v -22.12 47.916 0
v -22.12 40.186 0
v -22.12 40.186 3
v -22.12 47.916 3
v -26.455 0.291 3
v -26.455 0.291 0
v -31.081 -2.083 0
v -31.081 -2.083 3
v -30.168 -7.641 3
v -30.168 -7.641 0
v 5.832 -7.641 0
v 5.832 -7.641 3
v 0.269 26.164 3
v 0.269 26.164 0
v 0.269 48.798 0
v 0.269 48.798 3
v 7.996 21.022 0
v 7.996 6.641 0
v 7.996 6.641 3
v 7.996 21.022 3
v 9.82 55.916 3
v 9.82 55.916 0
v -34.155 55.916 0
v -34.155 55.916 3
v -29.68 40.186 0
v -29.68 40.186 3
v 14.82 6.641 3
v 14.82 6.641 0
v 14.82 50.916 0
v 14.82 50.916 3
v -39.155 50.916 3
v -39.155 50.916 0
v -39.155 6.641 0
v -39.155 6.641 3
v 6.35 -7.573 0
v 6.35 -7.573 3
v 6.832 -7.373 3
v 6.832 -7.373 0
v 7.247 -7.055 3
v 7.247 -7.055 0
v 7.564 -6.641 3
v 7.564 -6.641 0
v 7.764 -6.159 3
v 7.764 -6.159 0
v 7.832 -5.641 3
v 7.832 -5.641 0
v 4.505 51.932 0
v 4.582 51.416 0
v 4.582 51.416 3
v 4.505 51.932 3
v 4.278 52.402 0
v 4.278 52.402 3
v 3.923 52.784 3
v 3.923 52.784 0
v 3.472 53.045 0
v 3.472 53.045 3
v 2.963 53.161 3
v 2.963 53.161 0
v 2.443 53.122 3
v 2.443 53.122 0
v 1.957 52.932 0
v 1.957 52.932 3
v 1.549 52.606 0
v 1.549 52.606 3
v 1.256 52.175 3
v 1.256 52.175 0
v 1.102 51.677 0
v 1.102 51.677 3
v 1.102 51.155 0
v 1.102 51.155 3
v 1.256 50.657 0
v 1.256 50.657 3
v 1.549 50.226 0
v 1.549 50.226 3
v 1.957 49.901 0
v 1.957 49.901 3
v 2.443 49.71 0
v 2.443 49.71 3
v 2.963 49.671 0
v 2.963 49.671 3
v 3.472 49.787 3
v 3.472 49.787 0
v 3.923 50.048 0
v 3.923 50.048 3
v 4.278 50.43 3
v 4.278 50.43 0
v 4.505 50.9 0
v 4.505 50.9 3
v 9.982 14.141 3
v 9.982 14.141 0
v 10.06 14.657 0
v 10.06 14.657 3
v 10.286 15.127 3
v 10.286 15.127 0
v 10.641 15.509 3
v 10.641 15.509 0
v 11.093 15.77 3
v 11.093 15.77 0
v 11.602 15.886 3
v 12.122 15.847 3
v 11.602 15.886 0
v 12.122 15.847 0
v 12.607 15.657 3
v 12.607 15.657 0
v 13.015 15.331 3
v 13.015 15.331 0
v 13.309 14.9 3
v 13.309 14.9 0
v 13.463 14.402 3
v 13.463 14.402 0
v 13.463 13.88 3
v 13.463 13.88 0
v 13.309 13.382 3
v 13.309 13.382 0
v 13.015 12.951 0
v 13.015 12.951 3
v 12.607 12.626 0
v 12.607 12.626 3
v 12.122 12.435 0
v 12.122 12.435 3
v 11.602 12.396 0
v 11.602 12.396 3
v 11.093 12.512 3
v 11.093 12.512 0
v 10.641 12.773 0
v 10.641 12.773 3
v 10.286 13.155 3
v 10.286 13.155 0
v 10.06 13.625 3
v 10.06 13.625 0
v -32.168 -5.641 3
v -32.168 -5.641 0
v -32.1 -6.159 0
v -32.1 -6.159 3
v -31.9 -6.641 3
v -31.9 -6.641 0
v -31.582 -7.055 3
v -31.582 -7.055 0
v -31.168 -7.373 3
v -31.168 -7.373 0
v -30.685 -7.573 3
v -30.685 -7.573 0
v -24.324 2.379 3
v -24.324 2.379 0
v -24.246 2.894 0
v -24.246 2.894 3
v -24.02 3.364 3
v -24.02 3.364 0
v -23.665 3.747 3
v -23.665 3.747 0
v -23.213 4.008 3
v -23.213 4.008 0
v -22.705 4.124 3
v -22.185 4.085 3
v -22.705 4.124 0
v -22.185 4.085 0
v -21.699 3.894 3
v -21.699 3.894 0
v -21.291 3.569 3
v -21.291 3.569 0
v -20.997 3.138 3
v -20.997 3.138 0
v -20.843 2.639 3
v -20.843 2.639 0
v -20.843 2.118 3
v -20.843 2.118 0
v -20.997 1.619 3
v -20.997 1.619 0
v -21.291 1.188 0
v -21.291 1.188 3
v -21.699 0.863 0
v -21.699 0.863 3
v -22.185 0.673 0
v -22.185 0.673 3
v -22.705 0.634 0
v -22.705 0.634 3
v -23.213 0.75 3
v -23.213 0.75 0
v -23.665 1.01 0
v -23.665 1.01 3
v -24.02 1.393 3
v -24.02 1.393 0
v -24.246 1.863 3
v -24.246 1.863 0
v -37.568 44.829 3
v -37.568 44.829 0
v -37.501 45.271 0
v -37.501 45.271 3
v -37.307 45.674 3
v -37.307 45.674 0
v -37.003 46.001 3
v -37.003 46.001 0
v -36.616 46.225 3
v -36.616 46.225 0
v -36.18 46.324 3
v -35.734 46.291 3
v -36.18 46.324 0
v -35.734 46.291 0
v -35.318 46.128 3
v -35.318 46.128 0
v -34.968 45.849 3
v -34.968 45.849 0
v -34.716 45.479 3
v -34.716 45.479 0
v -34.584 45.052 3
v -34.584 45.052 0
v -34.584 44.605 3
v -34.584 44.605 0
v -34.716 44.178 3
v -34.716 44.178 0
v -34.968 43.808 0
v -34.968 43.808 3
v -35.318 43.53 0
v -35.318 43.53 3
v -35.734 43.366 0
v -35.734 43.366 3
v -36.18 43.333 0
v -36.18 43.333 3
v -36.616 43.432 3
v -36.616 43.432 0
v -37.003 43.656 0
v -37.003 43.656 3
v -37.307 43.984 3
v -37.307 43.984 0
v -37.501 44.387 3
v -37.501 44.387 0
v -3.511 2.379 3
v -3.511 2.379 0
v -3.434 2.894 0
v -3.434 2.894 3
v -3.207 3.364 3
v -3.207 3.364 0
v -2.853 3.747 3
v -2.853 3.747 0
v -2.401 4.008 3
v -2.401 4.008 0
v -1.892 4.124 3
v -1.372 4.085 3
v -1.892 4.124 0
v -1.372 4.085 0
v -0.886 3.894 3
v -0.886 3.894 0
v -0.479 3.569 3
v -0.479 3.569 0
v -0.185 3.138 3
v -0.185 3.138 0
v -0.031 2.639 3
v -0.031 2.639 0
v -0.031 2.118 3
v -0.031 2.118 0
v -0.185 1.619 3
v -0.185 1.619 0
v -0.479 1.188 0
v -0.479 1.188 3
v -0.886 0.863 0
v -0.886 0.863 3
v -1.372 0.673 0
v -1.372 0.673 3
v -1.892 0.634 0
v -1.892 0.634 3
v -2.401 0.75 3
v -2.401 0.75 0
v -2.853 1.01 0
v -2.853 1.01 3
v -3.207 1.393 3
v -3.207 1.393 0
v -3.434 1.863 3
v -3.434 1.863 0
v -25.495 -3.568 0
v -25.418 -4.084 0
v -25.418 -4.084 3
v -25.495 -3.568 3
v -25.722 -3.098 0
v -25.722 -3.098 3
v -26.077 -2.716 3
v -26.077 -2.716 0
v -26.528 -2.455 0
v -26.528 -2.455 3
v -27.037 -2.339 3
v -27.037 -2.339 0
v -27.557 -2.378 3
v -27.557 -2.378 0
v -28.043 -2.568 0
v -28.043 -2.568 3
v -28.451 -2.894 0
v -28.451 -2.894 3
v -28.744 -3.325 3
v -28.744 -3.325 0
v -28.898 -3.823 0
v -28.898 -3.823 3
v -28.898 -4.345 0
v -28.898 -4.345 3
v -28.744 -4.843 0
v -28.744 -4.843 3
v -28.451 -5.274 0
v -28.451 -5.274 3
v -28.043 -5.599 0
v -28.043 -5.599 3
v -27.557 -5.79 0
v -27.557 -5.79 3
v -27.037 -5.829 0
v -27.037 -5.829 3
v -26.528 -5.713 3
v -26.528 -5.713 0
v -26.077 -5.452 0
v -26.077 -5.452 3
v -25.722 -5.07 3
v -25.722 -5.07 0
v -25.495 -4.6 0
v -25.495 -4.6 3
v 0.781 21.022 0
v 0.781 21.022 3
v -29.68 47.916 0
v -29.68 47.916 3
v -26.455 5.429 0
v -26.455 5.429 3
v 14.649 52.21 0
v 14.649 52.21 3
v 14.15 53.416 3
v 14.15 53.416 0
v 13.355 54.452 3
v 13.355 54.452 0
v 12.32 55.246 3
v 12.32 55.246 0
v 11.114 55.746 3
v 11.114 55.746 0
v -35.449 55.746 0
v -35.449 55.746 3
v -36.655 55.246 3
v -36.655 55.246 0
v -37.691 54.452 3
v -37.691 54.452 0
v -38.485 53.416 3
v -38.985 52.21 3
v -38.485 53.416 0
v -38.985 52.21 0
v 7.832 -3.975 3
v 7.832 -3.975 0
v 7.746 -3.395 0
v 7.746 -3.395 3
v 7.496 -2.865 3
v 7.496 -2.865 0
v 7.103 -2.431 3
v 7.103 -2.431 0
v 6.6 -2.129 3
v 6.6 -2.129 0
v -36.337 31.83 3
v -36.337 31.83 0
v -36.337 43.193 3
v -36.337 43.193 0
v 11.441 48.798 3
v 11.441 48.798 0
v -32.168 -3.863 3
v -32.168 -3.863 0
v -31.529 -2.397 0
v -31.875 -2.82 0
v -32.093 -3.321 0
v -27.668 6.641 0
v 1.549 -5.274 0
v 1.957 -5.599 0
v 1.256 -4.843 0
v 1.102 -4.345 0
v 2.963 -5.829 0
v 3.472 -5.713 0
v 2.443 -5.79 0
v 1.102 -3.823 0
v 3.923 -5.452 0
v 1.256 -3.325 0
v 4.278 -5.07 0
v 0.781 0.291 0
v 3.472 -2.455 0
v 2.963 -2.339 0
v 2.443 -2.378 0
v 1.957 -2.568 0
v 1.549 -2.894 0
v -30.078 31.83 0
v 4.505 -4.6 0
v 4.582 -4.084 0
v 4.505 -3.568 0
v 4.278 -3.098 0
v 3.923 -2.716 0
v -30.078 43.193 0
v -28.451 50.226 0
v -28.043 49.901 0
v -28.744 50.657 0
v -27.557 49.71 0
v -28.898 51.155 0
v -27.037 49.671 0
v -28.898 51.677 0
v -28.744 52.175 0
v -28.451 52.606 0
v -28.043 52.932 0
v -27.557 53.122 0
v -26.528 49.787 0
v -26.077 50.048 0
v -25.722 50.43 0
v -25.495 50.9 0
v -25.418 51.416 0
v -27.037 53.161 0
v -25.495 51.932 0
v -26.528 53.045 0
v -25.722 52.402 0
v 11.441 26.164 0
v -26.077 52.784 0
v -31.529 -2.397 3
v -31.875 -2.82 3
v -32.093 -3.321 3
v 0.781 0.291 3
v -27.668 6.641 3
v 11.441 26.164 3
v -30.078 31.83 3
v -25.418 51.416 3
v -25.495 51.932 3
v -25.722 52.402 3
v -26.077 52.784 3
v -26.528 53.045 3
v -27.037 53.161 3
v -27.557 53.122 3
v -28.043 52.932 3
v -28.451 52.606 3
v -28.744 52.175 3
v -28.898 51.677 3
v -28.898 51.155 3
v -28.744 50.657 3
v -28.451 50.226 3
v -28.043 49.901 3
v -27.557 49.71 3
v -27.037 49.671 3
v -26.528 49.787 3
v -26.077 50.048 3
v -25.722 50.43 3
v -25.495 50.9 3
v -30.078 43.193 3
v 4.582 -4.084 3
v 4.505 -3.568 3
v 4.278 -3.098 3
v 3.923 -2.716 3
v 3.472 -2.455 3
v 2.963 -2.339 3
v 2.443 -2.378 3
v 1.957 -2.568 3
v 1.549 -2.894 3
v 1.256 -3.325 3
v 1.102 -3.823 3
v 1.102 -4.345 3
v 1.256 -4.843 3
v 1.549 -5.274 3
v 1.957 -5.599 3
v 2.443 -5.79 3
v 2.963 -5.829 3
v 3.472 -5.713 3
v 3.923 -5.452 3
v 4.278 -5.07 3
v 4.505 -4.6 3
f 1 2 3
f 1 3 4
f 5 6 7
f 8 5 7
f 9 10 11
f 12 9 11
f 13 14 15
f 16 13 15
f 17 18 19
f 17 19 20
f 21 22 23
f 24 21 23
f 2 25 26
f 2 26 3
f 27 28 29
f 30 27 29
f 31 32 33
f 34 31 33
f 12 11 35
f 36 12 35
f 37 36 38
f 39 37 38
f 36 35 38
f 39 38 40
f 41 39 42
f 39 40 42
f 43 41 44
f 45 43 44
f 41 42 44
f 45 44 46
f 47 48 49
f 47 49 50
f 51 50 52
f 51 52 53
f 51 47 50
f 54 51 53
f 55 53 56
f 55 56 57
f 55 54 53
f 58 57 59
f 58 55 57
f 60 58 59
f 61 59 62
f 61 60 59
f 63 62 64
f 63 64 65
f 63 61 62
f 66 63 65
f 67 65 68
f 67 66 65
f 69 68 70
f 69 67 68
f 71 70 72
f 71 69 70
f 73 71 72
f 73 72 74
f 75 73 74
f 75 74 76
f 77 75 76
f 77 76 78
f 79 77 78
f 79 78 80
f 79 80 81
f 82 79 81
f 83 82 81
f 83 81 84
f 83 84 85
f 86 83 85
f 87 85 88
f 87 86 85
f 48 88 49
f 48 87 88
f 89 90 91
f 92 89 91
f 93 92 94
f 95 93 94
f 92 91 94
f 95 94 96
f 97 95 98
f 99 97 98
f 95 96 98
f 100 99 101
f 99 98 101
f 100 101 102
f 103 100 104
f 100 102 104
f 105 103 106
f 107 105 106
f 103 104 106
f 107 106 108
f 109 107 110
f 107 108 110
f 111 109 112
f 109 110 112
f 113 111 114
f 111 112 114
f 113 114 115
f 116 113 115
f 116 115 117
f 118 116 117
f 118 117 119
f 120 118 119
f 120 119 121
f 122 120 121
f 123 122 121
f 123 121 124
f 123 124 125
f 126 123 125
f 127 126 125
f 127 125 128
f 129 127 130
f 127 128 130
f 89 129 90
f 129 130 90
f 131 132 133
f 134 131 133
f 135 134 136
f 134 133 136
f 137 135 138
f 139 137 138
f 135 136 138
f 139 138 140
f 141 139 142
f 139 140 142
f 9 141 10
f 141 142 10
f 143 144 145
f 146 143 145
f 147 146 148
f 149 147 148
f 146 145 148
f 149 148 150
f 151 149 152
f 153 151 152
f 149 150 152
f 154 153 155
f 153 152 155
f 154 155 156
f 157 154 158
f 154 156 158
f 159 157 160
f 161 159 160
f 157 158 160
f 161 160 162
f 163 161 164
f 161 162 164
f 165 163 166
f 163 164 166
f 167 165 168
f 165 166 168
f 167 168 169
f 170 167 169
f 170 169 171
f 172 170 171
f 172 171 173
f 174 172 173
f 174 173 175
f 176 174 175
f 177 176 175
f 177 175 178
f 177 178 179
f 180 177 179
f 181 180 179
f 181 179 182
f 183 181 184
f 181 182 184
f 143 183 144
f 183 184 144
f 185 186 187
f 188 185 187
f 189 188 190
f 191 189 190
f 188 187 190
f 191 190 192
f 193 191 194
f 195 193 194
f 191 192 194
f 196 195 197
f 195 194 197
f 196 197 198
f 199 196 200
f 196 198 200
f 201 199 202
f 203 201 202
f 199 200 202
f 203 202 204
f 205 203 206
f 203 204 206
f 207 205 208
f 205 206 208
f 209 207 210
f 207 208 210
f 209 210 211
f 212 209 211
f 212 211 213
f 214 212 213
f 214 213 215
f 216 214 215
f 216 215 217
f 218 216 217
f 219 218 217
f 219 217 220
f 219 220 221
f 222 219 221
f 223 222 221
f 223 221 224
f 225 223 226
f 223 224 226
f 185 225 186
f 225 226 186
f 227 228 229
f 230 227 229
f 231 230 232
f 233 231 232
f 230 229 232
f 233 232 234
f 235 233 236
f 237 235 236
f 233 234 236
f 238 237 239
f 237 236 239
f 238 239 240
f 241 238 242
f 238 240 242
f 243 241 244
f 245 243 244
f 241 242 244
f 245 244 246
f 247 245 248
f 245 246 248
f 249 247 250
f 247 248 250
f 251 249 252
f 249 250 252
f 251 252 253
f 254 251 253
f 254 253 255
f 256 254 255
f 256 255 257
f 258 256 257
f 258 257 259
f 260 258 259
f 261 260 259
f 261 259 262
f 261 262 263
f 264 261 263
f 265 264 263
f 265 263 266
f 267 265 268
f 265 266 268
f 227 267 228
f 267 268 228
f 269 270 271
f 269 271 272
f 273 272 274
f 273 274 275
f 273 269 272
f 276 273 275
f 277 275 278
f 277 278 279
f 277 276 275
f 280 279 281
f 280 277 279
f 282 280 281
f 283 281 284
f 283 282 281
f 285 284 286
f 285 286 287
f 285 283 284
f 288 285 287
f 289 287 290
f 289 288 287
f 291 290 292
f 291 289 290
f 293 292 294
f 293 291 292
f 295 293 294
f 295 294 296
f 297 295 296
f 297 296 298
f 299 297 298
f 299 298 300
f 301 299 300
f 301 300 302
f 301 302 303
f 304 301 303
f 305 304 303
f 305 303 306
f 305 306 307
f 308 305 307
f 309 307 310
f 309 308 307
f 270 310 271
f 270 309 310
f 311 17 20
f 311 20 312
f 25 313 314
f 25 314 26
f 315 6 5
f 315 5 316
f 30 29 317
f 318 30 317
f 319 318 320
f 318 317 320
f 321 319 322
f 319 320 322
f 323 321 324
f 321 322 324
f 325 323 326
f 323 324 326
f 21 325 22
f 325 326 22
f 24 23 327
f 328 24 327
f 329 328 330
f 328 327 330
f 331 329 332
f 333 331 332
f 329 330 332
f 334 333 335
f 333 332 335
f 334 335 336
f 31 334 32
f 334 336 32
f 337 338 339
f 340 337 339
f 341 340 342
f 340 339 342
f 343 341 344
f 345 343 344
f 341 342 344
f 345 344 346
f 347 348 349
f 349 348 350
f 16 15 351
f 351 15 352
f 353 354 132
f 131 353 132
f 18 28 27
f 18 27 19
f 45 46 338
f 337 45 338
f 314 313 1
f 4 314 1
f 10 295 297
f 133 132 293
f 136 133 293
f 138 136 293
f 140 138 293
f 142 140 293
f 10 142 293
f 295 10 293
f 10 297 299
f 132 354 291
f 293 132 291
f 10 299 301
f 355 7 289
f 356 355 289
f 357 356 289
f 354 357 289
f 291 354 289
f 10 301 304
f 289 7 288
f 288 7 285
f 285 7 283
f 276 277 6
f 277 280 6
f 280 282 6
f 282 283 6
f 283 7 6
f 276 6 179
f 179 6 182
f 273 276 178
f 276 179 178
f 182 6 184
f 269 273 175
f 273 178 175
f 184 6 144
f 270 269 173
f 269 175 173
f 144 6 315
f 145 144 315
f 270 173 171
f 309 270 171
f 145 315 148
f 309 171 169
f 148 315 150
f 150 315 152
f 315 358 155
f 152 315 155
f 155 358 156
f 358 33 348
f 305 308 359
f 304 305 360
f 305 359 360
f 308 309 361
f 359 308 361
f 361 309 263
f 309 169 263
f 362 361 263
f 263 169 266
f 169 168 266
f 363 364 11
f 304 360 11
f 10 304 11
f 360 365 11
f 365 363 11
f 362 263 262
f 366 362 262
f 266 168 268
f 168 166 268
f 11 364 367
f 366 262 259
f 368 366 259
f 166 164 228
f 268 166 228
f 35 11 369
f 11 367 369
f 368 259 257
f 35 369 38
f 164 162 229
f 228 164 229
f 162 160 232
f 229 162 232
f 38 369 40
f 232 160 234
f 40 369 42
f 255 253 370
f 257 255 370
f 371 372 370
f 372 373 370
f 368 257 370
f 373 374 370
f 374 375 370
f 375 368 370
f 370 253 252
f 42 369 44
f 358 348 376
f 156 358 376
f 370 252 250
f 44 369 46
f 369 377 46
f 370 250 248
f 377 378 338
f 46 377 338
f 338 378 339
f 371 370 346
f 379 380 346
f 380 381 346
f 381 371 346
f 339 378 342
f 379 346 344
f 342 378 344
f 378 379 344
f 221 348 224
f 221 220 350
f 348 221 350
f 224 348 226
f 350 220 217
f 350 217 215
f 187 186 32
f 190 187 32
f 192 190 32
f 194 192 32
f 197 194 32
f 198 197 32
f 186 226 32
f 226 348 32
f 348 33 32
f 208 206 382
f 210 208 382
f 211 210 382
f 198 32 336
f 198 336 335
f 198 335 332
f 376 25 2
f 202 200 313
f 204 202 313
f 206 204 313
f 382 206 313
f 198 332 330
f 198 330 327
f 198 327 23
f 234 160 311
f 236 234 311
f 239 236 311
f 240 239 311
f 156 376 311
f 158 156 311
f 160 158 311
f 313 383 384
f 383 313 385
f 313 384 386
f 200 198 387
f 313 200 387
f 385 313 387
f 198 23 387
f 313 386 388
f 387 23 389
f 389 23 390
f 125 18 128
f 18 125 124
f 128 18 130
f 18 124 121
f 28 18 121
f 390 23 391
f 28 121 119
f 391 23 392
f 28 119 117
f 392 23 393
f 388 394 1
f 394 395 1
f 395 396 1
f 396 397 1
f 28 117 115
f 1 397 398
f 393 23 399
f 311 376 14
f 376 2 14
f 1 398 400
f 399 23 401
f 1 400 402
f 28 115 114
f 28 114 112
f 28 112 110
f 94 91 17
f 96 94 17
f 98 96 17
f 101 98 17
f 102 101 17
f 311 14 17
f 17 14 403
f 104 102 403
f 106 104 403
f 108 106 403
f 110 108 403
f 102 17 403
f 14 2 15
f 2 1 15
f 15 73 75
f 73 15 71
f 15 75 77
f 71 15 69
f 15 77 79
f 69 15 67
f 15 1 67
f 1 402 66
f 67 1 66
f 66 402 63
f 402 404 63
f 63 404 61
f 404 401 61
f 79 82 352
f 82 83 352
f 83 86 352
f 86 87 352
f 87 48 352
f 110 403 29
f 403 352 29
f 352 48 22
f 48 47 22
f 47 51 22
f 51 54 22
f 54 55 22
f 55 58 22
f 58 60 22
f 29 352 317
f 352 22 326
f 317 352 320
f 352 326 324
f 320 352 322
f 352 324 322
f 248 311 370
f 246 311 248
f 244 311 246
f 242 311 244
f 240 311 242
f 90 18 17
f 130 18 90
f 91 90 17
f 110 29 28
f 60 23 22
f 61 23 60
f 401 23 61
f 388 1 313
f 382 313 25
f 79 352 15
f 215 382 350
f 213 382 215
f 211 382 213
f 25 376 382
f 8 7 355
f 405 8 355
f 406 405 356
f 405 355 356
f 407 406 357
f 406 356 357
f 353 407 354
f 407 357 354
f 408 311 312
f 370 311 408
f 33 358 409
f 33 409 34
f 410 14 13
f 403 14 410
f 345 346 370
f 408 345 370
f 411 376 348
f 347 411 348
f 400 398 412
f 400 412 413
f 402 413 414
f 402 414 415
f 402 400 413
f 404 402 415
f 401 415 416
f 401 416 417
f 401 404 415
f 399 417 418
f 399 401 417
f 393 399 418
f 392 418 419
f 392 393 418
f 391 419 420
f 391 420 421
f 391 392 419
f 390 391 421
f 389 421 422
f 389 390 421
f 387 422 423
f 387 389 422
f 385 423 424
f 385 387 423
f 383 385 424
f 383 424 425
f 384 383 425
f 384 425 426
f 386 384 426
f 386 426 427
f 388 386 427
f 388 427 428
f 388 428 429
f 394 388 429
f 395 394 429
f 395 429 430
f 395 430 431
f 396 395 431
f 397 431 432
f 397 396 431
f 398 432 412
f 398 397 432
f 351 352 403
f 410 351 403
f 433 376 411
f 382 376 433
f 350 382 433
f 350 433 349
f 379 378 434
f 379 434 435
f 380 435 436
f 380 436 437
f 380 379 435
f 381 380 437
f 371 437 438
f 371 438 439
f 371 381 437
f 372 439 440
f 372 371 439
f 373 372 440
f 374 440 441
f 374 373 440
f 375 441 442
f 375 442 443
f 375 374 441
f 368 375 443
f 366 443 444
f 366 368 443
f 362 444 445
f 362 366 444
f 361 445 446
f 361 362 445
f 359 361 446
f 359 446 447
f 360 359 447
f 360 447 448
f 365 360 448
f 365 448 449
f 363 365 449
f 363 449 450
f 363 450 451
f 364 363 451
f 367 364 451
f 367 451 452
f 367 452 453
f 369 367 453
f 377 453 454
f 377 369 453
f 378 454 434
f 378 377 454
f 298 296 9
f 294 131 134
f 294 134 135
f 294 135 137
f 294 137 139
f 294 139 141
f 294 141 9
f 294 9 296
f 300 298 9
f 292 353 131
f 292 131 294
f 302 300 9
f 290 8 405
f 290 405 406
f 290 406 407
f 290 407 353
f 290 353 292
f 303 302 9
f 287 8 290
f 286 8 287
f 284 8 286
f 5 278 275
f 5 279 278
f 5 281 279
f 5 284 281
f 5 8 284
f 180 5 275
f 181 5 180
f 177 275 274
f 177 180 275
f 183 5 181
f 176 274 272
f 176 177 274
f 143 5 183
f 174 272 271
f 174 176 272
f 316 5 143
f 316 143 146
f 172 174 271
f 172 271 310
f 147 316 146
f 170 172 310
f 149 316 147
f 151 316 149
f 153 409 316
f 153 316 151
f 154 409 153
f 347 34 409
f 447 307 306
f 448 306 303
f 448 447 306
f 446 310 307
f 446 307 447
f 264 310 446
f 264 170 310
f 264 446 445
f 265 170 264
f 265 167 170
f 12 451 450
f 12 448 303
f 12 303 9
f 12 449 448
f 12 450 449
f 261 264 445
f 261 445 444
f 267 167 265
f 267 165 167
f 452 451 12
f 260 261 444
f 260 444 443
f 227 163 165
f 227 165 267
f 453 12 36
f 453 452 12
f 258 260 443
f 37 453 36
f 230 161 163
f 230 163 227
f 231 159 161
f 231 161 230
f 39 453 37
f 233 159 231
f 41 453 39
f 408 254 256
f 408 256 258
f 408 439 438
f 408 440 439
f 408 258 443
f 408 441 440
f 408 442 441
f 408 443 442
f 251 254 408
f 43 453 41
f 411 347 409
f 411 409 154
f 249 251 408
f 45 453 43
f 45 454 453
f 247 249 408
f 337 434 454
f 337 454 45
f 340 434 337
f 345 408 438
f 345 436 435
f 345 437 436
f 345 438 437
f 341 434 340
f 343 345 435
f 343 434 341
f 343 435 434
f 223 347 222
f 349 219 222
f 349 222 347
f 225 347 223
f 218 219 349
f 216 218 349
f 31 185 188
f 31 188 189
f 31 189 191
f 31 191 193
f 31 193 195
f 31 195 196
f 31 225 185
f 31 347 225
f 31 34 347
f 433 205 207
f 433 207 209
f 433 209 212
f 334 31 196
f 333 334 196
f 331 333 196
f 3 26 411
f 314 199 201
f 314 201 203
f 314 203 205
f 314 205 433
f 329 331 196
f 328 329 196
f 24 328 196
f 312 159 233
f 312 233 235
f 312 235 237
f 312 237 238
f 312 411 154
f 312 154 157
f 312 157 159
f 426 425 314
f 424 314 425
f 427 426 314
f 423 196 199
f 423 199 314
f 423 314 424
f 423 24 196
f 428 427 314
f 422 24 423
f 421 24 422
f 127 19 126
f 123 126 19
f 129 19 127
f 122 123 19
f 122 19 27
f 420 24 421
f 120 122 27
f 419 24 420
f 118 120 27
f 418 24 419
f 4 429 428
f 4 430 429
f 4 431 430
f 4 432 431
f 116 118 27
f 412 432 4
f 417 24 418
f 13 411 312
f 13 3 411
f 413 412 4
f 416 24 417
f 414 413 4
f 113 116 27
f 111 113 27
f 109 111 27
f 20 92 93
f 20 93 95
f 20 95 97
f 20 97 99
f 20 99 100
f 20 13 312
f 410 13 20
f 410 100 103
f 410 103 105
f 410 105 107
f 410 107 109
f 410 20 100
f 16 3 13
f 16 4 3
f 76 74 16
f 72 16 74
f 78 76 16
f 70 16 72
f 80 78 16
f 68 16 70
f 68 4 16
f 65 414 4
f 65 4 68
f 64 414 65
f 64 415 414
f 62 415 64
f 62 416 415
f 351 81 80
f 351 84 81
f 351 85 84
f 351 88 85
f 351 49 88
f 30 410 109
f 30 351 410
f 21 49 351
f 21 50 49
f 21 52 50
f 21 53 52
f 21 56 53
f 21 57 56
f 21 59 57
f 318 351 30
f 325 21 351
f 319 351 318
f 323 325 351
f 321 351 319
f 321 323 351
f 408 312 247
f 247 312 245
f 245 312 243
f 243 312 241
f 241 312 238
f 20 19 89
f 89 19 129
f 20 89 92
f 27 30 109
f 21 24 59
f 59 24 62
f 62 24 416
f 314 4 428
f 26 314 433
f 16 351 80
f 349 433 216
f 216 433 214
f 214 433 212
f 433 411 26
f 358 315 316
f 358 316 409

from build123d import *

# Parameters (mm, degrees)
SKETCH2_R           = 1.75
SKETCH2_R_2         = 1.5
SKETCH2_W           = 6.259541377
SKETCH2_H           = 11.363852943
BOSS_EXTRUDE1_DEPTH = 3
SKETCH3_R           = 1.75
BOSS_EXTRUDE2_DEPTH = 3


with BuildPart() as part:
    # Sketch2 → Boss-Extrude1 (new body)
    with BuildSketch(Plane(origin=(0, 0, 0), x_dir=(-1, 0, 0), z_dir=(0, 0, -1))):
        Polygon((-11.441133476, 47.916141751), (-14.819831639, 47.916141751), (-14.819831639, 6.641141751), (-7.995621622, 6.641141751), (-7.995621622, 21.022330273), (-0.780778634, 21.022330273), (-0.780778634, 0.291141751), (26.455168361, 0.291141751), (26.455168361, 5.428807174), (27.667502938, 6.641141751), (39.155168361, 6.641141751), (39.155168361, 47.916141751), (29.679646442, 47.916141751), (29.679646442, 40.185572696), (22.120281557, 40.185572696), (22.120281557, 47.916141751), (-0.269040639, 47.916141751), (-0.269040639, 26.164281213), (-11.441133476, 26.164281213), align=None)
        with Locations((1.761418361, 2.378641751)):
            Circle(SKETCH2_R, mode=Mode.SUBTRACT)
        with Locations((36.067668361, 44.828641751)):
            Circle(SKETCH2_R_2, mode=Mode.SUBTRACT)
        with Locations((22.573918361, 2.378641751)):
            Circle(SKETCH2_R, mode=Mode.SUBTRACT)
        with Locations((-11.732331639, 14.141141751)):
            Circle(SKETCH2_R, mode=Mode.SUBTRACT)
        with Locations((33.207620521, 37.511488804)):
            Rectangle(SKETCH2_W, SKETCH2_H, mode=Mode.SUBTRACT)
    extrude(amount=-BOSS_EXTRUDE1_DEPTH)

    # Sketch3 → Boss-Extrude2 (add)
    # profile 1 of 2: a face of its own
    with BuildSketch(Plane.XY):
        with BuildLine():
            Line((-39.155168361, 47.916141751), (0.269040639, 47.916141751))
            Line((0.269040639, 47.916141751), (0.269040639, 48.797882205))
            Line((0.269040639, 48.797882205), (11.441133476, 48.797882205))
            Line((11.441133476, 48.797882205), (11.441133476, 47.916141751))
            Line((11.441133476, 47.916141751), (14.819831639, 47.916141751))
            Line((14.819831639, 47.916141751), (14.819831639, 50.916141751))
            ThreePointArc((14.819831639, 50.916141751), (13.355365545, 54.451675657), (9.819831639, 55.916141751))
            Line((9.819831639, 55.916141751), (-34.155168361, 55.916141751))
            ThreePointArc((-34.155168361, 55.916141751), (-37.690702267, 54.451675657), (-39.155168361, 50.916141751))
            Line((-39.155168361, 50.916141751), (-39.155168361, 47.916141751))
        make_face()
        with Locations((-27.167668361, 51.416141751)):
            Circle(SKETCH3_R, mode=Mode.SUBTRACT)
        with Locations((2.832331639, 51.416141751)):
            Circle(SKETCH3_R, mode=Mode.SUBTRACT)
    # profile 2 of 2: a face of its own
    with BuildSketch(Plane.XY):
        with BuildLine():
            Line((-26.455168361, 0.291141751), (-31.080954927, -2.083201693))
            ThreePointArc((-31.080954927, -2.083201693), (-31.87450361, -2.820045974), (-32.167668361, -3.862501457))
            Line((-32.167668361, -3.862501457), (-32.167668361, -5.640994596))
            ThreePointArc((-32.167668361, -5.640994596), (-31.581881924, -7.055208159), (-30.167668361, -7.640994596))
            Line((-30.167668361, -7.640994596), (5.832331639, -7.640994596))
            ThreePointArc((5.832331639, -7.640994596), (7.246545201, -7.055208159), (7.832331639, -5.640994596))
            Line((7.832331639, -5.640994596), (7.832331639, -3.975377608))
            ThreePointArc((7.832331639, -3.975377608), (7.496029114, -2.865372784), (6.600220929, -2.128665384))
            Line((6.600220929, -2.128665384), (0.780778634, 0.291141751))
            Line((0.780778634, 0.291141751), (-26.455168361, 0.291141751))
        make_face()
        with Locations((-27.167668361, -4.083858249)):
            Circle(SKETCH3_R, mode=Mode.SUBTRACT)
        with Locations((2.832331639, -4.083858249)):
            Circle(SKETCH3_R, mode=Mode.SUBTRACT)
    extrude(amount=BOSS_EXTRUDE2_DEPTH)


solid = part.part
